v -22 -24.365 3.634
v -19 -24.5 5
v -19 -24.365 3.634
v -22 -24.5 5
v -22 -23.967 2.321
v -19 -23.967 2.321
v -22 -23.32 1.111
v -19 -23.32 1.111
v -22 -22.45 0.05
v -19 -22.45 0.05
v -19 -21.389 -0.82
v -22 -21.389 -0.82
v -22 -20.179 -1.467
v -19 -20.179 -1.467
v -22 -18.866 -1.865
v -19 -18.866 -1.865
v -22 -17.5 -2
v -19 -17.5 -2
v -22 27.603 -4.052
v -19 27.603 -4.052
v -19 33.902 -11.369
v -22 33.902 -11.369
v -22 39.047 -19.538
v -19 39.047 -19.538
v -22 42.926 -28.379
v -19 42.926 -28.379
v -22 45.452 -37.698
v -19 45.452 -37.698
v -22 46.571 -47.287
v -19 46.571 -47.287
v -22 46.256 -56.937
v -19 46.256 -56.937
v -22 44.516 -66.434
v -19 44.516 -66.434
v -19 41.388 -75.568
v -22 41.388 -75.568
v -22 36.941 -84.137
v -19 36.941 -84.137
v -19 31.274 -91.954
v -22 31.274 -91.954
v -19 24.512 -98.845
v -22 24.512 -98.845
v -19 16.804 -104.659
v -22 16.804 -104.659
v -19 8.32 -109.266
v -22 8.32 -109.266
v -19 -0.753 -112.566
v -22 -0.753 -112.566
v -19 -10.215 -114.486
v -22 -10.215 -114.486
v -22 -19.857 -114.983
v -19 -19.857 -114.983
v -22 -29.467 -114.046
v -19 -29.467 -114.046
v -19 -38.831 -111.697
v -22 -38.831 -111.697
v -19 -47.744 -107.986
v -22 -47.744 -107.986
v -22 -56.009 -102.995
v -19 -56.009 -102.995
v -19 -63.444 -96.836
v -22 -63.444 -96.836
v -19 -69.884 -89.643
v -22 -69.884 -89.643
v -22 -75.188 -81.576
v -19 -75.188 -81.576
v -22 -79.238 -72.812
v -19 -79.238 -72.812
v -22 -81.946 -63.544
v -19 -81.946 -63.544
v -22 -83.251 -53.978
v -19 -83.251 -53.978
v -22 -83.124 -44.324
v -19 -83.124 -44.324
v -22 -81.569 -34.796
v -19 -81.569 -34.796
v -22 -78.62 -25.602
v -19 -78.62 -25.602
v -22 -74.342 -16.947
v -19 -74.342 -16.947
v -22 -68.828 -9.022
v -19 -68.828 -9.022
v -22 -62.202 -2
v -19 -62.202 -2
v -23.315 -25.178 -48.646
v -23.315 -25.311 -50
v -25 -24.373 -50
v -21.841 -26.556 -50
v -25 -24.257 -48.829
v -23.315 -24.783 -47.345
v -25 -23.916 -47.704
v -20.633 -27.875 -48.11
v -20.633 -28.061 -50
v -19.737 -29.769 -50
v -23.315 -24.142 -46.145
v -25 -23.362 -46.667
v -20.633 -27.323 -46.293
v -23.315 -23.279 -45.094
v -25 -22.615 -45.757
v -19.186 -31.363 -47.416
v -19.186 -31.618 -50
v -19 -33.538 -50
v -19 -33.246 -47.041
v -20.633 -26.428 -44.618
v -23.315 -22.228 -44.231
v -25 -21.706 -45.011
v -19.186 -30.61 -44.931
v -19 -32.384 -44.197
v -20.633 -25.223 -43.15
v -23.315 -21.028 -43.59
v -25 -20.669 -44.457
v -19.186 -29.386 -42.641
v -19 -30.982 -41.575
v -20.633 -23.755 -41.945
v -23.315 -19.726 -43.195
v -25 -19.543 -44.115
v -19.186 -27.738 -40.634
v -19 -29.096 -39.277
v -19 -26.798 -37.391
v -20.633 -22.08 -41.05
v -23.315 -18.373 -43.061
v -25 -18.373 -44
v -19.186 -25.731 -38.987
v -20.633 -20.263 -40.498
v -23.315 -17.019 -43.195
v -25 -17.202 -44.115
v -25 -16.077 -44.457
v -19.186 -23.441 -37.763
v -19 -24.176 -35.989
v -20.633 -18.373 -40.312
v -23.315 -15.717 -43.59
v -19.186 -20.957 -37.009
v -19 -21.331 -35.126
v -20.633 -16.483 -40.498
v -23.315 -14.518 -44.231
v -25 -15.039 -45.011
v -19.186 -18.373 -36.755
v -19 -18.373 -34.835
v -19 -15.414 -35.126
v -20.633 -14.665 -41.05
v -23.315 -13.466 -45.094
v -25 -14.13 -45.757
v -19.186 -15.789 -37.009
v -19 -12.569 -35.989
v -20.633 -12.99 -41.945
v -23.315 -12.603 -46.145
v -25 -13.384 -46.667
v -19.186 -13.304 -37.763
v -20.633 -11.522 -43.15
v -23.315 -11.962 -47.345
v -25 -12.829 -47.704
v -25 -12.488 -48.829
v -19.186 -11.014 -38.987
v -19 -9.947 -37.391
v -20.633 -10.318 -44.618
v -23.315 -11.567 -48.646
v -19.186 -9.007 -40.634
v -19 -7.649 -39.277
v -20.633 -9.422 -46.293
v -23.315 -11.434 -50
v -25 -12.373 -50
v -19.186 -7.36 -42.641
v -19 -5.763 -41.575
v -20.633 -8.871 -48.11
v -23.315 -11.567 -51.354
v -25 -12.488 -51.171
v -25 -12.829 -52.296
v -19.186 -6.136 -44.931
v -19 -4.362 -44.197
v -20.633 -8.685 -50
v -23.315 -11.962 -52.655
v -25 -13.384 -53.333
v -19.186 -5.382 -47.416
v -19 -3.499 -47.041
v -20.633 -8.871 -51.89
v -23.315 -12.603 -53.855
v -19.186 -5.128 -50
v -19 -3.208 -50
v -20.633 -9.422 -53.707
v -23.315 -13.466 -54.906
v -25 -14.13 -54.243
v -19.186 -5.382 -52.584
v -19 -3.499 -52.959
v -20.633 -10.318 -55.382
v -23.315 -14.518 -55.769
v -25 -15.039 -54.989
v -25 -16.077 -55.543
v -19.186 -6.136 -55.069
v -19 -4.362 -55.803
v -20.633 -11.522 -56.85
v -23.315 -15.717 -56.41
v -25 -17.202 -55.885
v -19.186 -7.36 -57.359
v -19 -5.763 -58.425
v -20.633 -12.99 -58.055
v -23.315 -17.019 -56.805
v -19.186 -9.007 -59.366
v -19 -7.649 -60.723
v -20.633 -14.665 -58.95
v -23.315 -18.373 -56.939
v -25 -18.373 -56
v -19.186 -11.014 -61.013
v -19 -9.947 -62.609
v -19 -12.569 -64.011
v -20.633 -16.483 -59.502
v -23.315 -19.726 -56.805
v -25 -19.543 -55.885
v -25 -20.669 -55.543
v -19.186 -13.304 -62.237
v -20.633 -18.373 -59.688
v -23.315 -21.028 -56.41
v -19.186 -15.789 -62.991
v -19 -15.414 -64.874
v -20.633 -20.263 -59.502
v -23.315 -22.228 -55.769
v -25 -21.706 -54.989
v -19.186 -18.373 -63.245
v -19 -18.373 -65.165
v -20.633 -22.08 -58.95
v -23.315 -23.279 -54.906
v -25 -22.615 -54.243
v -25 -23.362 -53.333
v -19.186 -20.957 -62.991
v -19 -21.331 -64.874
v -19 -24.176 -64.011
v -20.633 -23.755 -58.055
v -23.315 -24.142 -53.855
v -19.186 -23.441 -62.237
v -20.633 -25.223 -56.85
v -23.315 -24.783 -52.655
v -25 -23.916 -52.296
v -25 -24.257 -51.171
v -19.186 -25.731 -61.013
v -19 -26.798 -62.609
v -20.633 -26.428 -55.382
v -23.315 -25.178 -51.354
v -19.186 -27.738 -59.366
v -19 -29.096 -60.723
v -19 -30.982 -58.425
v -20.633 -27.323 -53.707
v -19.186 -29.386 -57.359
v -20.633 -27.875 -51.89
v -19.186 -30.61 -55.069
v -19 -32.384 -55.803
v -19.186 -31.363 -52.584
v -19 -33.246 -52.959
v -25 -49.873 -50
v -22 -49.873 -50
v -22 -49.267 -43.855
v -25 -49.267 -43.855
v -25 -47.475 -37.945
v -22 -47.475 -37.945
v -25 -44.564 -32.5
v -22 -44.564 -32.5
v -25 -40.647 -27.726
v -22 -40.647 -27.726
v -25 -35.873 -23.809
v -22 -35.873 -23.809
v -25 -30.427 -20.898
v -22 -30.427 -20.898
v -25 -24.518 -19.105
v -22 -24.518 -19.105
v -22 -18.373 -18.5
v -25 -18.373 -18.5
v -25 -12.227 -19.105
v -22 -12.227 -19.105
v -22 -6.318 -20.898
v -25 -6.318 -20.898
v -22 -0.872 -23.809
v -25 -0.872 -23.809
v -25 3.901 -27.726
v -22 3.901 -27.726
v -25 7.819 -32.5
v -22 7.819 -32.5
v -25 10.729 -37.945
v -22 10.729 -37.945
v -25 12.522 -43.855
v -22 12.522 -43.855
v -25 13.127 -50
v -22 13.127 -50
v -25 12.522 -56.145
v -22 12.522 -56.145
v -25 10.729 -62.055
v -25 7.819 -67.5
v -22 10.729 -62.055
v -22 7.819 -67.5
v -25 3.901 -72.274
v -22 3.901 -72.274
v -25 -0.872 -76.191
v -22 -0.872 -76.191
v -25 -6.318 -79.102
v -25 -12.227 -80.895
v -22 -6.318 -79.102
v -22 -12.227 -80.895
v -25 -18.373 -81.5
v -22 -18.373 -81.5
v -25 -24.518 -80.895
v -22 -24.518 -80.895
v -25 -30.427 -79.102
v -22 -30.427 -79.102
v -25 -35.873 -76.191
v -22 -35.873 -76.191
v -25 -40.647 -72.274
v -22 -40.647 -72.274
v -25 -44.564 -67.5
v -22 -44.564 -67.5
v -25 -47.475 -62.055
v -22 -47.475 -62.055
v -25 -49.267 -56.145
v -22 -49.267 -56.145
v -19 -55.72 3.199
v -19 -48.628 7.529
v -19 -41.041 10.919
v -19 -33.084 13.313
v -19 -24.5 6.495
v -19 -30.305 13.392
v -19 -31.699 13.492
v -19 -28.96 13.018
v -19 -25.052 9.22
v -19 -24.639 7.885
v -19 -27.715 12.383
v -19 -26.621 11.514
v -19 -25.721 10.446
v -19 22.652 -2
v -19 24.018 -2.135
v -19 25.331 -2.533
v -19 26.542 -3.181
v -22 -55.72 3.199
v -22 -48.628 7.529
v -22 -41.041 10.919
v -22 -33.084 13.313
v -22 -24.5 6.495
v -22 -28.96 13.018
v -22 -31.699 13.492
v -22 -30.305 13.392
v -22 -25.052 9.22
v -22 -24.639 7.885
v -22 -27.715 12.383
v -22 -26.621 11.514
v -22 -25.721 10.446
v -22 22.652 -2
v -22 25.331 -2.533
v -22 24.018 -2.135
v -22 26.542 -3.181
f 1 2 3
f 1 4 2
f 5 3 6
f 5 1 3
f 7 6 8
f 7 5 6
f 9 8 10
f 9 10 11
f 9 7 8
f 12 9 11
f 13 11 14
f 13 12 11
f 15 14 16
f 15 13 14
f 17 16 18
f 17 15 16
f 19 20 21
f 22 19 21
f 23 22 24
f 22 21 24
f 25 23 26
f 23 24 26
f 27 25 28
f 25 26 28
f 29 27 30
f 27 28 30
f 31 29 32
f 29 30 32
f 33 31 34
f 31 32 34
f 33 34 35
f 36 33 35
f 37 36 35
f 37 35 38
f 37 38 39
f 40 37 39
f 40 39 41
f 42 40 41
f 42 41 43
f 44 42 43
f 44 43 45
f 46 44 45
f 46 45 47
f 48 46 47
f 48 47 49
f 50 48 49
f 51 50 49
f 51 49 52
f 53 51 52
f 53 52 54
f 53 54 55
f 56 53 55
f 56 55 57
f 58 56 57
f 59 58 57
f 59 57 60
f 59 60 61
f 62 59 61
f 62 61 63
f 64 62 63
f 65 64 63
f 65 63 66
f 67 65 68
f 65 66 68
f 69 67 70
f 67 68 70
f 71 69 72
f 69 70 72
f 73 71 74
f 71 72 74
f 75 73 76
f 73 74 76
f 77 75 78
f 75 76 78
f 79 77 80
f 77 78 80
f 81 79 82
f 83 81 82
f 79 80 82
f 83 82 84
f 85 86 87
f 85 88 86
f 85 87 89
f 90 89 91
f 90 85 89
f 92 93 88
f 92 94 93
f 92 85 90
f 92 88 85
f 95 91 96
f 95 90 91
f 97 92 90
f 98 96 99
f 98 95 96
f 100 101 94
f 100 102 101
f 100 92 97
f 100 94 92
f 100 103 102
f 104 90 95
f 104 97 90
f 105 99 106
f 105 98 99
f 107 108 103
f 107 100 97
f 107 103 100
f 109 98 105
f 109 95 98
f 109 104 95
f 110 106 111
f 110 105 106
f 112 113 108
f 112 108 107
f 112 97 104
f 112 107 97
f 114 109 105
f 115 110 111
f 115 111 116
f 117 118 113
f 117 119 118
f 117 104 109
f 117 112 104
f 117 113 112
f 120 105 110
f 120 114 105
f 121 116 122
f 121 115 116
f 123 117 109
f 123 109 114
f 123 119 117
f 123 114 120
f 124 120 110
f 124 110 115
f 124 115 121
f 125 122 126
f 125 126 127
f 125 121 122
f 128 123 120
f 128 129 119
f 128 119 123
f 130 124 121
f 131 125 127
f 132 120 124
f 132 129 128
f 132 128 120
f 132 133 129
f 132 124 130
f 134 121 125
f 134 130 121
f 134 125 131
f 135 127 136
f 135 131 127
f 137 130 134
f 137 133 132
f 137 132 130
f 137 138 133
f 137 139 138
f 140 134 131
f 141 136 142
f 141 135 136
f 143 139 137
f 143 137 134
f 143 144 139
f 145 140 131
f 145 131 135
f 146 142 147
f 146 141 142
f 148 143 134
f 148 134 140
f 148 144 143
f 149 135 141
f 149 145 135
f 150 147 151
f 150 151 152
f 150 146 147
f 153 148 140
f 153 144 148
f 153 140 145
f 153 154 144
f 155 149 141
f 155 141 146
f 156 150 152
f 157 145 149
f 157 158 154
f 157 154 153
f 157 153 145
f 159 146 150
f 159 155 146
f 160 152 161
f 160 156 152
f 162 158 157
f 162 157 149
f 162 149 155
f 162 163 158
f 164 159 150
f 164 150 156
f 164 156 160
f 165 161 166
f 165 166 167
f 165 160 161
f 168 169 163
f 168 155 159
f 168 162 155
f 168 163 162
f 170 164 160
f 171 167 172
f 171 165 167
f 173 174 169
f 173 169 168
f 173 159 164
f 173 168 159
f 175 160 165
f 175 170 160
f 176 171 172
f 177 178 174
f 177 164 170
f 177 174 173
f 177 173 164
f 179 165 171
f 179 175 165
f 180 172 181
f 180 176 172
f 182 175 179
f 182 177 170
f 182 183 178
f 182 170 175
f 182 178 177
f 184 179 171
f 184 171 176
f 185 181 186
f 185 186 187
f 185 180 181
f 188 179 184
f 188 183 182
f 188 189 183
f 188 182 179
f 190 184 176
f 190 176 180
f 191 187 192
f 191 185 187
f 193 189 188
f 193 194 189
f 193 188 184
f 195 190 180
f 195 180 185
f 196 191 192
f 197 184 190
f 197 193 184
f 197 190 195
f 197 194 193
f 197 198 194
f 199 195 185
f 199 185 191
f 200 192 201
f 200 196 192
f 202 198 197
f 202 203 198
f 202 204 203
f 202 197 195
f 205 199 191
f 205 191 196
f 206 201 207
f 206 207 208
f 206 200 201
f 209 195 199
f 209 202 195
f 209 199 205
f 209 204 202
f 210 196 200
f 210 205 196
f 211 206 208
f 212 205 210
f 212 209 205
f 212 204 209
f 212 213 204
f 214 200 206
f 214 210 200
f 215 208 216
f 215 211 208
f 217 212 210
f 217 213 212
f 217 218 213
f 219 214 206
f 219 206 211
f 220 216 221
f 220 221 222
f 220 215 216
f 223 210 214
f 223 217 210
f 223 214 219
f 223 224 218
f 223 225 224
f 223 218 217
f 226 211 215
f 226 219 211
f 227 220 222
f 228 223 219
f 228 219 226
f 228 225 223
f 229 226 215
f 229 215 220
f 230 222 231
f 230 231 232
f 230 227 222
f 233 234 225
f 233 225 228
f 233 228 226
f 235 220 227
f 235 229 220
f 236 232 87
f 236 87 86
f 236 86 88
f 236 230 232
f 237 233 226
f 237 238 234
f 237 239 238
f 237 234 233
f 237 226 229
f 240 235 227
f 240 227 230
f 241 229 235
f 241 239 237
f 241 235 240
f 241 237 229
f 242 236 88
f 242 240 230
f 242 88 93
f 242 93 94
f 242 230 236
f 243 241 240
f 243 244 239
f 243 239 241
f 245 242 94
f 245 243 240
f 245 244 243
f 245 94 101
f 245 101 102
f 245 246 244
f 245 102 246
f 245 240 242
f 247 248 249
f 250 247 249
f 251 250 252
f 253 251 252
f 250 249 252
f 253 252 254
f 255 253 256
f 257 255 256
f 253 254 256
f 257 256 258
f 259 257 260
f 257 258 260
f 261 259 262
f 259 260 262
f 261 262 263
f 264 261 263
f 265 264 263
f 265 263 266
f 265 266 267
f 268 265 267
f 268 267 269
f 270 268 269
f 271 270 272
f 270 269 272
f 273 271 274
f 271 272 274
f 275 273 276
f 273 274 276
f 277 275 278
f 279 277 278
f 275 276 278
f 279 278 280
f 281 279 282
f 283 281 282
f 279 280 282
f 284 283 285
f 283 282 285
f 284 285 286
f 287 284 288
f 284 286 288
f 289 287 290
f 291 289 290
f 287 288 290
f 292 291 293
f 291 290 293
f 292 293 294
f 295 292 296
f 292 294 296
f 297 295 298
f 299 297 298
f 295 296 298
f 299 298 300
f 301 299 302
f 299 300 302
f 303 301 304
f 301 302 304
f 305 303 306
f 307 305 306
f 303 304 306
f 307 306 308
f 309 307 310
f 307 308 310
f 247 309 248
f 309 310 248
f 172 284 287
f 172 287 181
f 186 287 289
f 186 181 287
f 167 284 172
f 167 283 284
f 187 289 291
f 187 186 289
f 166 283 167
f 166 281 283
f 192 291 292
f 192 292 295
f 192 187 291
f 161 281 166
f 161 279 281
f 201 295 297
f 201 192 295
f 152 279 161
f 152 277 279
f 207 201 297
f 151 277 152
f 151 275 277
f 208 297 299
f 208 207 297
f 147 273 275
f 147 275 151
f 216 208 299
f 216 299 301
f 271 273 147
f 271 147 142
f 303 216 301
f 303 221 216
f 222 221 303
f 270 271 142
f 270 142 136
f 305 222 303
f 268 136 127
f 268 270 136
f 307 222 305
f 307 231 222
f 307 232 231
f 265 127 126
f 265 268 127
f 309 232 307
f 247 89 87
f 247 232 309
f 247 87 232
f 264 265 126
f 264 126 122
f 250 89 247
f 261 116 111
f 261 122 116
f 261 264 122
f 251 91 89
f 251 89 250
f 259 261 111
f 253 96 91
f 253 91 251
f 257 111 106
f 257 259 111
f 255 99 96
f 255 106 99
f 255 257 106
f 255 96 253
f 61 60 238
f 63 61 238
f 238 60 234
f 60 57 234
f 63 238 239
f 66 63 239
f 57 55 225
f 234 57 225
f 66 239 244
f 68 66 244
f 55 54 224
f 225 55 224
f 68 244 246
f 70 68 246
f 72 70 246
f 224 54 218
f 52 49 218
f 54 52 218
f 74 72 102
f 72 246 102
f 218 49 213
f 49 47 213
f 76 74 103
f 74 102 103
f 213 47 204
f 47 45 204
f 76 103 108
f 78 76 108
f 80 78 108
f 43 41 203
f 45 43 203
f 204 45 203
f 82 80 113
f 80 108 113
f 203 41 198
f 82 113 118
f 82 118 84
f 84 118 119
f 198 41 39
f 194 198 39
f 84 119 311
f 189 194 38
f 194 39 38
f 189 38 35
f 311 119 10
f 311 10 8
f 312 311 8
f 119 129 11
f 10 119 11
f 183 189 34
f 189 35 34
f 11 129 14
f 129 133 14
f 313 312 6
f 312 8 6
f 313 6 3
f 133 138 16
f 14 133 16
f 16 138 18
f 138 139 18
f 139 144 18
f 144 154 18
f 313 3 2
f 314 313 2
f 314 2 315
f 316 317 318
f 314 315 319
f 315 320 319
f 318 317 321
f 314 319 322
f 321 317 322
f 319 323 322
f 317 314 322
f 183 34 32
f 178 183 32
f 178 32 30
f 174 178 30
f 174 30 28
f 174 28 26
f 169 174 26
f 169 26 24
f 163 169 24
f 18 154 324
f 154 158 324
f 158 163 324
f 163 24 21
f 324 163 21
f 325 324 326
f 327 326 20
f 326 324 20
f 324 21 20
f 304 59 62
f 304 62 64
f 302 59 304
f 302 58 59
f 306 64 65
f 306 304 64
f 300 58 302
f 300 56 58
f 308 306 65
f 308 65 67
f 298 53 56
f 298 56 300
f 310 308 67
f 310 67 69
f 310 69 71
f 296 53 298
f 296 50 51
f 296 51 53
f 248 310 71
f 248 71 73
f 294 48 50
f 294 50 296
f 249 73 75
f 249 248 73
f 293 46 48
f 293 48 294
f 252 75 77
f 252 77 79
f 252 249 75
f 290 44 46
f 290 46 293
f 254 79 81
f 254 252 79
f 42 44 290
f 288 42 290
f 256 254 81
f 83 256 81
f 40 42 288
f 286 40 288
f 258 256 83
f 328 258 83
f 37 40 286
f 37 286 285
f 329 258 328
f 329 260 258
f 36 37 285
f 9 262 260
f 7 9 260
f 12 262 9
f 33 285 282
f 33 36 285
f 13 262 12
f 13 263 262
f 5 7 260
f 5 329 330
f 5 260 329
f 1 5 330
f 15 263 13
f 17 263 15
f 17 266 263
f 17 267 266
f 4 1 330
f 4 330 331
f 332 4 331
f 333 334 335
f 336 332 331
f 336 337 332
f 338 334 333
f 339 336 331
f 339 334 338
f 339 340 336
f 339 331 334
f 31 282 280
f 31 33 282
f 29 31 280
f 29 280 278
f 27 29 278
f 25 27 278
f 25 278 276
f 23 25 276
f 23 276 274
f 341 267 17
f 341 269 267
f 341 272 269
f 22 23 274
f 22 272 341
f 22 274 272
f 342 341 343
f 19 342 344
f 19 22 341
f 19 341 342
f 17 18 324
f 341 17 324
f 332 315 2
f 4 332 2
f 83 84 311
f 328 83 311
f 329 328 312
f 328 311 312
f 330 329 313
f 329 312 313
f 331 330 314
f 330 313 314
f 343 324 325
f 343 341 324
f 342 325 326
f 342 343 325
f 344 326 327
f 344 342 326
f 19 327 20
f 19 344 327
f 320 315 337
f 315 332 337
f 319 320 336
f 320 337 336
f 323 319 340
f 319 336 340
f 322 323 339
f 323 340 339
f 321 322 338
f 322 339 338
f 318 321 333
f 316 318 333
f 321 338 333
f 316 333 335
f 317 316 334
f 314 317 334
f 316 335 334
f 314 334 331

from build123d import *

# Parameters (mm, degrees)
SKETCH1_W           = 52
SKETCH1_H           = 38
BULK_EXTRUDE_DEPTH  = 3
FILLET1_R           = 7
SKETCH2_R           = 31.5
MOTOR_SUPPORT_DEPTH = 3
SKETCH3_R           = 6
WIRE_PASSTHRU_DEPTH = 143.168954603
FILLET2_R           = 10


with BuildPart() as part:
    # Sketch1 → BULK EXTRUDE (new body)
    # profile 1 of 3: a face of its own
    with BuildSketch(Plane.ZY.offset(19)):
        with BuildLine():
            Line((-2, -62.201941274), (-2, -24.5))
            Line((-2, -24.5), (-2, 25.456486729))
            ThreePointArc((-2, 25.456486729), (-115, -18.372727273), (-2, -62.201941274))
        make_face()
        with Locations((-57, 0)):
            Rectangle(SKETCH1_W, SKETCH1_H, mode=Mode.SUBTRACT)
    # profile 2 of 3: a face of its own
    with BuildSketch(Plane.ZY.offset(19)):
        with Locations((-57, 0)):
            Rectangle(SKETCH1_W, SKETCH1_H)
    # profile 3 of 3: a face of its own
    with BuildSketch(Plane.ZY.offset(19)):
        with BuildLine():
            Line((14.71055964, -24.5), (-2, -24.5))
            Line((-2, -24.5), (-2, -62.201941274))
            ThreePointArc((-2, -62.201941274), (9.424545918, -44.711355605), (14.71055964, -24.5))
        make_face()
    extrude(amount=BULK_EXTRUDE_DEPTH)

    # Fillet1
    fillet1_edges = [part.edges().sort_by_distance(p)[0] for p in [
        (-20.5, -24.5, -2),
        (-20.5, -24.5, 14.71055964),
        (-20.5, 25.456486729, -2),
    ]]
    fillet(fillet1_edges, radius=FILLET1_R)

    # Sketch2 → MOTOR SUPPORT (add)
    with BuildSketch(Plane.ZY.offset(22)):
        with Locations(Location((-50, -18.372727273, 0), (0, 0, 270))):
            Circle(SKETCH2_R)
    extrude(amount=MOTOR_SUPPORT_DEPTH)

    # Sketch3 → WIRE PASSTHRU (cut, through all)
    with BuildSketch(Plane.ZY.offset(25)):
        with Locations(Location((-50, -18.372727273, 0), (0, 0, 270))):
            Circle(SKETCH3_R)
    extrude(amount=-WIRE_PASSTHRU_DEPTH, mode=Mode.SUBTRACT)

    # Fillet2
    # the kernel refuses this fillet: 10 mm, written as the material it takes off along each edge
    with BuildSketch(Plane(origin=(-19, -18.372727273, -50), x_dir=(0, -1, 0), z_dir=(0, 0, -1))) as fillet2_piece_1:
        with BuildLine():
            CenterArc((15.16515139, 10), FILLET2_R, 203.578178478, 66.421821522)
            Line((6, 6), (5.816696972, 5.92))
            ThreePointArc((5.816696972, 5.92), (5.8, 3), (5.8, 0))
            Line((5.8, 0), (6, -0.2))
            Line((6, -0.2), (15.16515139, -0.2))
            Line((15.16515139, -0.2), (15.16515139, 0))
        make_face()
    revolve(axis=Axis((-19, -18.372727273, -50), (-1, 0, 0)), mode=Mode.SUBTRACT)


solid = part.part
